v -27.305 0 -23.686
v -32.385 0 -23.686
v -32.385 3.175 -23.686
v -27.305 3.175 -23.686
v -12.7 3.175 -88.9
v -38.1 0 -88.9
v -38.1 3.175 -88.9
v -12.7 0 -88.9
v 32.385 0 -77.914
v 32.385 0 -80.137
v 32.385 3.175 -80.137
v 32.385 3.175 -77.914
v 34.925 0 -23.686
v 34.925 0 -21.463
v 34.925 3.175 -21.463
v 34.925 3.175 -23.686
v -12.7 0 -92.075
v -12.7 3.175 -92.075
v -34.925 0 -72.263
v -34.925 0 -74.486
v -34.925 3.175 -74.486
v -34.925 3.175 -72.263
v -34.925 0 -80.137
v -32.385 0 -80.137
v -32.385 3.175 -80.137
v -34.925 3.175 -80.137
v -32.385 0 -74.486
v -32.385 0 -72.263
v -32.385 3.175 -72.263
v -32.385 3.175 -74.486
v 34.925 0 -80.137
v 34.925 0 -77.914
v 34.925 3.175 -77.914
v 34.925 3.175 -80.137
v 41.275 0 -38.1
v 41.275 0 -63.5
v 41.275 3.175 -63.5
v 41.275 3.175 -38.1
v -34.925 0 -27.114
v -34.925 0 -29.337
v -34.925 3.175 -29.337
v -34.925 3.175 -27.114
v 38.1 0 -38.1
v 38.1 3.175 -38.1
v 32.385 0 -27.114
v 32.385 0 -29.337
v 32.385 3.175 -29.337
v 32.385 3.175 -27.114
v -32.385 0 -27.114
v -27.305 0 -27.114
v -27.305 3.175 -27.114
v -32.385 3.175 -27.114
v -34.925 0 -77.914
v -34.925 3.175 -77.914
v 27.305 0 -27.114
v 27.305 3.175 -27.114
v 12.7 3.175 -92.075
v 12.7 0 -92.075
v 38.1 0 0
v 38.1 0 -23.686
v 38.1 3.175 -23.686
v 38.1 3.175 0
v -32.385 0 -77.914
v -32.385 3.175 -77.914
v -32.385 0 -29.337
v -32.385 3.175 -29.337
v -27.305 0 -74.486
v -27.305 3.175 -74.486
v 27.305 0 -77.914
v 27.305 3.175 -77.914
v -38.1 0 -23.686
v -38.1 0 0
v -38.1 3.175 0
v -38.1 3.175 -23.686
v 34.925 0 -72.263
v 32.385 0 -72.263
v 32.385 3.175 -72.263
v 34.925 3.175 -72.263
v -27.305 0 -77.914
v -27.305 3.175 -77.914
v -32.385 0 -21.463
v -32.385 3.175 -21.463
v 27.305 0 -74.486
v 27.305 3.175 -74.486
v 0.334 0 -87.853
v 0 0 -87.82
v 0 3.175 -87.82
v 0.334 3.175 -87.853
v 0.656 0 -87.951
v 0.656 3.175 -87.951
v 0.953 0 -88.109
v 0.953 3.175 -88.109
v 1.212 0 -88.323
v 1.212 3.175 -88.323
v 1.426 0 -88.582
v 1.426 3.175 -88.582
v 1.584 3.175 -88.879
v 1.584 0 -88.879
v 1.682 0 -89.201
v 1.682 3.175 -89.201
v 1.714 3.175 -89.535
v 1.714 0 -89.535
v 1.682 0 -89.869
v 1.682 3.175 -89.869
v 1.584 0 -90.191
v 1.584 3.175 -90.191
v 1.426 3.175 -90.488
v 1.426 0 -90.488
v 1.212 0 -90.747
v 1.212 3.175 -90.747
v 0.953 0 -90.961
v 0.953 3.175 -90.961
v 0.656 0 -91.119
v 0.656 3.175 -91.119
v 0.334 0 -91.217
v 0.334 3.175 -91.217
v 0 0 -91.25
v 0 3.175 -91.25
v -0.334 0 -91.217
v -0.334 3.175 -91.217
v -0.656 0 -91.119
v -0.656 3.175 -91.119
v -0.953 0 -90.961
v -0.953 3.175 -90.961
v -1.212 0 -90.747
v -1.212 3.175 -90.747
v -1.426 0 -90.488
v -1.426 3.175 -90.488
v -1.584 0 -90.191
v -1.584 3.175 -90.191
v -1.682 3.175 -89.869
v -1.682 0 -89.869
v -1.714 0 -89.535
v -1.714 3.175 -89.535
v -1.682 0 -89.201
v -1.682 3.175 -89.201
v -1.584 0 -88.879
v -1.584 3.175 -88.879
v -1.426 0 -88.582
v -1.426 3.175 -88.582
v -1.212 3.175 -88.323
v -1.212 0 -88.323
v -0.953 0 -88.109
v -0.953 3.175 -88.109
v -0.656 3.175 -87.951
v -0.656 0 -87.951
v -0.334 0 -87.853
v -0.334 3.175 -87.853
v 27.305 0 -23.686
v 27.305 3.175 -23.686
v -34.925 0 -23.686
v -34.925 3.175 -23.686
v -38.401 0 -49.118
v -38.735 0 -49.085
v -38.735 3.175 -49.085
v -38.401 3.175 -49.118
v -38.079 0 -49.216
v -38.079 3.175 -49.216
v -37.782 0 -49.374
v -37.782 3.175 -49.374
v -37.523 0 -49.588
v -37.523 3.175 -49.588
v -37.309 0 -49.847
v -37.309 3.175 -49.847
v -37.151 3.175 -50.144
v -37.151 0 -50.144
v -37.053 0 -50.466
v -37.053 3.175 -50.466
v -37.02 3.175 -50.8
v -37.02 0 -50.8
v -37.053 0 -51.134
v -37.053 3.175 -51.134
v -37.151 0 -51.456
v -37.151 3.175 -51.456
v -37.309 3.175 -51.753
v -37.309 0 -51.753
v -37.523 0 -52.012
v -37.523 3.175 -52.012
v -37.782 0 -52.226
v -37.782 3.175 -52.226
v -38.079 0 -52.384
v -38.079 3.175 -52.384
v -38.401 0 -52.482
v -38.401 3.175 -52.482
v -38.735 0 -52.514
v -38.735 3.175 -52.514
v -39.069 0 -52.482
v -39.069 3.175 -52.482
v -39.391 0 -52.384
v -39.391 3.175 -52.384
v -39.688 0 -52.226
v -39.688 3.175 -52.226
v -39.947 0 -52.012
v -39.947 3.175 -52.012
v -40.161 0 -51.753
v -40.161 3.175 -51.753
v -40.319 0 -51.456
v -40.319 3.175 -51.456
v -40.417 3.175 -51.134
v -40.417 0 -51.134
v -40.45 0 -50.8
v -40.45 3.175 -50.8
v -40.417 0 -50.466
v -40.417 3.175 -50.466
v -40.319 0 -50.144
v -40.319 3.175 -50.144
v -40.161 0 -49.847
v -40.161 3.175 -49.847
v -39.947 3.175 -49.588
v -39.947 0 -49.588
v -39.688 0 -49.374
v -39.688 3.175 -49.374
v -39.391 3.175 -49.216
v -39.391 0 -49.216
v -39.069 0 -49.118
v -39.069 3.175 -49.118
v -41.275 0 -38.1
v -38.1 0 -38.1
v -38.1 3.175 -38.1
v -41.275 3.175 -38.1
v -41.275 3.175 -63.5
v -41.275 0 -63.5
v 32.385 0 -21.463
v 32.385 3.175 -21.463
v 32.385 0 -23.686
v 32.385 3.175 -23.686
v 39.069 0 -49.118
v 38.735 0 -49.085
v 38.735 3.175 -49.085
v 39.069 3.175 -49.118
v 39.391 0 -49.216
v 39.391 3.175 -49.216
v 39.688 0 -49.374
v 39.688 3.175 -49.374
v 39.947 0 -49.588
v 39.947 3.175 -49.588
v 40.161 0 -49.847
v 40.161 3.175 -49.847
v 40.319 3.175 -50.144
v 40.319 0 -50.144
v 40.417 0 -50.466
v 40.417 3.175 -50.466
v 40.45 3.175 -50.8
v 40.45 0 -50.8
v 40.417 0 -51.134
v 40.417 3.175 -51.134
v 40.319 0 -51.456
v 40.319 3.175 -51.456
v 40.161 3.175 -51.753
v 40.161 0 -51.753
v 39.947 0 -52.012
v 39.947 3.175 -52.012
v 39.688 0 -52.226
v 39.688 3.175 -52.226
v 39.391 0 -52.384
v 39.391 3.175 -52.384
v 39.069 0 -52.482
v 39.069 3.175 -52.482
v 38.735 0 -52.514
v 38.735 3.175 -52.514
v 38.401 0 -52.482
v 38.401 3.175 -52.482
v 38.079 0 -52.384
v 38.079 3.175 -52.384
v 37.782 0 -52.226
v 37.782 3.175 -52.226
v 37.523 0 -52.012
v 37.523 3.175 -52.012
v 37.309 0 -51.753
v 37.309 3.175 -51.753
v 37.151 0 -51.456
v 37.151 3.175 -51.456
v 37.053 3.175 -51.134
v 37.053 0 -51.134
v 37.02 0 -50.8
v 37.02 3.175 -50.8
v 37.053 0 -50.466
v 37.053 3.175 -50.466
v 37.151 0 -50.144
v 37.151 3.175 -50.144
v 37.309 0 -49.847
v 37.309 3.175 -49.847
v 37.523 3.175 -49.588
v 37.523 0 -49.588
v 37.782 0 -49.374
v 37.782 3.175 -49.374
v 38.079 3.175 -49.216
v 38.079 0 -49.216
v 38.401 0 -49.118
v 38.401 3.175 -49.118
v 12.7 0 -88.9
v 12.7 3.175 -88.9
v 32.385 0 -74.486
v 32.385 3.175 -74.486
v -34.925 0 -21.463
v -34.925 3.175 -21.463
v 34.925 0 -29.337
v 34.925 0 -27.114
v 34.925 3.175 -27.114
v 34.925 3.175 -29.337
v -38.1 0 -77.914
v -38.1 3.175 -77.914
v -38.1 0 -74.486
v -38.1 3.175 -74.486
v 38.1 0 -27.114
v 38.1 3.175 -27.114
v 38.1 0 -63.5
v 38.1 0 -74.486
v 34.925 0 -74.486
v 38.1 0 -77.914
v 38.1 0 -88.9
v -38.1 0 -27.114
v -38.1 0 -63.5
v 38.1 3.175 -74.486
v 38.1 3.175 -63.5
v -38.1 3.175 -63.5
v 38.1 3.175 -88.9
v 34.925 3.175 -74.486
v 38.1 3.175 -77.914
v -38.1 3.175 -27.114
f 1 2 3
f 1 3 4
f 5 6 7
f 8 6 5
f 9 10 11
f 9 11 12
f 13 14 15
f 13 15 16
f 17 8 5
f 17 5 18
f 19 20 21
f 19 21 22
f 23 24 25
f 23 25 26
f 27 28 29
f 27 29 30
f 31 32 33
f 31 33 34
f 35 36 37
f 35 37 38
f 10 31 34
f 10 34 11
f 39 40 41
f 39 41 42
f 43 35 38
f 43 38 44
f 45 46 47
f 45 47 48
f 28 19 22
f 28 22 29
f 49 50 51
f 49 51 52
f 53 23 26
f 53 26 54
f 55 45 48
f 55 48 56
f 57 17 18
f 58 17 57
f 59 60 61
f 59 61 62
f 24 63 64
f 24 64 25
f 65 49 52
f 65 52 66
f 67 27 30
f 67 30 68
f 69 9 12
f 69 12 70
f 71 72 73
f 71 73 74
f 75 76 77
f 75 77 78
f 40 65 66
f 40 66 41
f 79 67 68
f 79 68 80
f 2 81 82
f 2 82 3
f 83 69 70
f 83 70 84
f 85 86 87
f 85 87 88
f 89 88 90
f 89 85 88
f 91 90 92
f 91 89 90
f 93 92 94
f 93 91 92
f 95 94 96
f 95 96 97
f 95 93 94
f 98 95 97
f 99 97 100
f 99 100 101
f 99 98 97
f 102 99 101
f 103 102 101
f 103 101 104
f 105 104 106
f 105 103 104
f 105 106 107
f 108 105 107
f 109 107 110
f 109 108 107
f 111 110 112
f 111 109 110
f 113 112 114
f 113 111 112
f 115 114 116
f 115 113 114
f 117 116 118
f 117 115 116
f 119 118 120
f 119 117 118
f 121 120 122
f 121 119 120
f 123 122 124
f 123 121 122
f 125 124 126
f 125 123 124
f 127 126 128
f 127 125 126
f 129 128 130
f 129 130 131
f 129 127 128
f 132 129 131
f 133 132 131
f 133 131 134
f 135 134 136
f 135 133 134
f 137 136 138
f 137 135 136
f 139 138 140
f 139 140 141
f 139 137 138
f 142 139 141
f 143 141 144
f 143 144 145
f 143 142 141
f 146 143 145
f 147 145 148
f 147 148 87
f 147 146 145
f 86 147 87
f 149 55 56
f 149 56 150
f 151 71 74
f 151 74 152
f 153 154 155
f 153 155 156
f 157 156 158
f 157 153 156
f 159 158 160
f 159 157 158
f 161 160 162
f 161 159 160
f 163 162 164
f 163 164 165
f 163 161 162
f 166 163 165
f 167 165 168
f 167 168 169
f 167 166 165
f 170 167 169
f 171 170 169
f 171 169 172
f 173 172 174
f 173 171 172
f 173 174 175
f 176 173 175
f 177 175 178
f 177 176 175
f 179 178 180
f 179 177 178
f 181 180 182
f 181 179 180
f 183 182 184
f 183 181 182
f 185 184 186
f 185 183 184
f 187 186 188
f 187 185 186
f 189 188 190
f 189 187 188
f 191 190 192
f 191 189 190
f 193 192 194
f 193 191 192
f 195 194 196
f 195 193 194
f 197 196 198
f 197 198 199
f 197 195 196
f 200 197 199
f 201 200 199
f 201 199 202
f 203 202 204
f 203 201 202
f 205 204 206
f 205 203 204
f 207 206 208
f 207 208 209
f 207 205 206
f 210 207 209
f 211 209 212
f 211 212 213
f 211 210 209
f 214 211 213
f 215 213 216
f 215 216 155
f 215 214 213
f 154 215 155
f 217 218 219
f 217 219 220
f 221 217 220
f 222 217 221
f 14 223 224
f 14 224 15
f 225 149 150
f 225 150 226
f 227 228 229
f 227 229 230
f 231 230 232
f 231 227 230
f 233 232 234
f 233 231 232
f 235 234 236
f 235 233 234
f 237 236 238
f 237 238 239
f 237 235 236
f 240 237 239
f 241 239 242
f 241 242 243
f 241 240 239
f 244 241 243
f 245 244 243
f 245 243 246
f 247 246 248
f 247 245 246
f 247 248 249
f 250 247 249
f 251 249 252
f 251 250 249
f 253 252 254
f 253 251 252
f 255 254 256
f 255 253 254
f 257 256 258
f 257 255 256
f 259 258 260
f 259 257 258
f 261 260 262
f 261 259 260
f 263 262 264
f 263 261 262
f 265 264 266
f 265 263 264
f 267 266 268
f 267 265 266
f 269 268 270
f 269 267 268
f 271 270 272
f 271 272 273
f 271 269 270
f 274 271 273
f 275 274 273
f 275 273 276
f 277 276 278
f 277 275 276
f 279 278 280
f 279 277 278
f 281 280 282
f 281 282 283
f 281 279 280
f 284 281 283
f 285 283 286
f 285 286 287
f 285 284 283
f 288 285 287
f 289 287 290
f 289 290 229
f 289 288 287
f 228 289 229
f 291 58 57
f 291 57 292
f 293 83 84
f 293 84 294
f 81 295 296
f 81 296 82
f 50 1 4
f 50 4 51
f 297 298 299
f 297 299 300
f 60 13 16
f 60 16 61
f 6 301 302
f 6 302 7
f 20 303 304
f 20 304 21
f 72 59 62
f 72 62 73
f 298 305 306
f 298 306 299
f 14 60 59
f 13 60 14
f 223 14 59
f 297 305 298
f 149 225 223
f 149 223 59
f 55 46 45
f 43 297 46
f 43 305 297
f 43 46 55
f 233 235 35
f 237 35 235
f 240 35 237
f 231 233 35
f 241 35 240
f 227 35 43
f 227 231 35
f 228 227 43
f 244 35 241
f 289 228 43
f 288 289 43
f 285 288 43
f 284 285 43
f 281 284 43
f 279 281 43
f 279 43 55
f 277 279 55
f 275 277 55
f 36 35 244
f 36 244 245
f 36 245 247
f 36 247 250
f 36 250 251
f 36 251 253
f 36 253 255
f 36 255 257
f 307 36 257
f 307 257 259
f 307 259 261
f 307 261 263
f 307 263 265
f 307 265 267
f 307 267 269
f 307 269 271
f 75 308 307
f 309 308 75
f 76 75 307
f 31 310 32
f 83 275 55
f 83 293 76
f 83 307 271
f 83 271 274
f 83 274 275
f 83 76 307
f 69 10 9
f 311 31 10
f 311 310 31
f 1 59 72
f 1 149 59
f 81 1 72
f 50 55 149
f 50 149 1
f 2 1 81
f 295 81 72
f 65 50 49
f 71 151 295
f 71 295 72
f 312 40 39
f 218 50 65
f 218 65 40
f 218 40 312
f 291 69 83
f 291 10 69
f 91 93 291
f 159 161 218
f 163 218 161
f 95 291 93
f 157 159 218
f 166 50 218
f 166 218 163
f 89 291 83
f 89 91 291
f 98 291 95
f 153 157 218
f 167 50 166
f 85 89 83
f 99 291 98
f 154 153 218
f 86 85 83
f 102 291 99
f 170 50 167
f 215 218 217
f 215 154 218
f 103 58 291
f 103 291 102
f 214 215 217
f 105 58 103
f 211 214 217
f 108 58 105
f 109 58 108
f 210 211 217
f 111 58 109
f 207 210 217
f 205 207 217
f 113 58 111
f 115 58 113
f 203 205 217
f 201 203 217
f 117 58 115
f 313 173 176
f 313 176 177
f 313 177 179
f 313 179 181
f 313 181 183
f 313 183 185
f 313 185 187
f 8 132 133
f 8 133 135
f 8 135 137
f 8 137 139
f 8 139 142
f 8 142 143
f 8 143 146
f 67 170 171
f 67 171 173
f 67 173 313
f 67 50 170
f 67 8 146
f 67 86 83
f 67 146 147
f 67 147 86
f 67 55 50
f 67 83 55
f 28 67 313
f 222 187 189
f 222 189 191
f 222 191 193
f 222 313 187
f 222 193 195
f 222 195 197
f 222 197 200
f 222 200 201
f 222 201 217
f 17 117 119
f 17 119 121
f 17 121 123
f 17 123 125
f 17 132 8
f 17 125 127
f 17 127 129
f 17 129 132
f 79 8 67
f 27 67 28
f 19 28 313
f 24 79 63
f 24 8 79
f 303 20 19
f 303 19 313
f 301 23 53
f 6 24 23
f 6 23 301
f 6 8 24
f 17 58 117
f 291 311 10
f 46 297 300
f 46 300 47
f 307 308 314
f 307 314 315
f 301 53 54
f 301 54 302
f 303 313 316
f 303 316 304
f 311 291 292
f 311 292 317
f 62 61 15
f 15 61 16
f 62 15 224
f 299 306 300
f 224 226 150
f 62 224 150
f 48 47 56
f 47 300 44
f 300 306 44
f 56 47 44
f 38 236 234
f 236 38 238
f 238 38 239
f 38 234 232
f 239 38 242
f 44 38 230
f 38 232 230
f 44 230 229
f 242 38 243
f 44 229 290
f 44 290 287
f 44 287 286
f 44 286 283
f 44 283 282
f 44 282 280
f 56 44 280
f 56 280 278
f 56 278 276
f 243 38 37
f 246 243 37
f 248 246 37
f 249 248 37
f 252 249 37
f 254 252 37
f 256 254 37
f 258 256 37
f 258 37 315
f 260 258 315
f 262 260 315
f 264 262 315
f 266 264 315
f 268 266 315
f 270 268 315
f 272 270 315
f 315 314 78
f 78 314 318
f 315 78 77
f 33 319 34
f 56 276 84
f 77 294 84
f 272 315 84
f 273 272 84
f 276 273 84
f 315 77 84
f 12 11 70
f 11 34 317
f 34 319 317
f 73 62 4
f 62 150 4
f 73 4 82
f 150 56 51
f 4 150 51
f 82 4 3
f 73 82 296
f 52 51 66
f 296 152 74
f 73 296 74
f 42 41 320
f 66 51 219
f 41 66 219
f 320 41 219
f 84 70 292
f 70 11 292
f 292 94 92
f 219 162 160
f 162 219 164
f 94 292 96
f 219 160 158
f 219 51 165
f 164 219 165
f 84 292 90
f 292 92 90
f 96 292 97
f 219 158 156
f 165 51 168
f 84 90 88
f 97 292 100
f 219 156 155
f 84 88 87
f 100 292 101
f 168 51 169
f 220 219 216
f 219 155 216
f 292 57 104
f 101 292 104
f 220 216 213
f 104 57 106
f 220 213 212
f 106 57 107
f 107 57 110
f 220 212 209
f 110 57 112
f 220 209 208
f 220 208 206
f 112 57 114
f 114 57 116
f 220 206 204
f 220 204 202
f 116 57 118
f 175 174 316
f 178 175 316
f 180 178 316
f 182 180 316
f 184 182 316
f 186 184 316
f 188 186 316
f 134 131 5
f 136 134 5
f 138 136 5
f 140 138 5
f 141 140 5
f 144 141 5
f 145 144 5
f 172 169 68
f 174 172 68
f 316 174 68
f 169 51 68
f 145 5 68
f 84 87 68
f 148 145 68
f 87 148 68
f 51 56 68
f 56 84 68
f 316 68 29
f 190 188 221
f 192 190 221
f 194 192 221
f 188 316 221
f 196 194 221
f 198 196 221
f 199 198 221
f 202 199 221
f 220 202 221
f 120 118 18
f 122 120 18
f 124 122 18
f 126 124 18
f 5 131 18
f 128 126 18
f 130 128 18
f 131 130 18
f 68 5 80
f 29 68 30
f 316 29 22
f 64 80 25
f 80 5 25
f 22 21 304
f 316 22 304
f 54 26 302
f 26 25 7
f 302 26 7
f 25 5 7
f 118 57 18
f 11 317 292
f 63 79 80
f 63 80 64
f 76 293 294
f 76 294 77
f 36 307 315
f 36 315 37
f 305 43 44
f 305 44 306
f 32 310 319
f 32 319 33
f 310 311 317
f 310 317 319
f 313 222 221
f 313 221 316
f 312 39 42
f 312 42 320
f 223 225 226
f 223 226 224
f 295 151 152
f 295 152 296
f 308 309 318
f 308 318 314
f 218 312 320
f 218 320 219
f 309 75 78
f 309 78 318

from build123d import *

# Parameters (mm, degrees)
SKETCH1_R           = 1.7145
BOSS_EXTRUDE1_DEPTH = 3.175


with BuildPart() as part:
    # Sketch1 → Boss-Extrude1 (new body)
    with BuildSketch(Plane(origin=(0, 0, 0), x_dir=(1, 0, 0), z_dir=(0, 1, 0))):
        Polygon((-38.1, 0), (-38.1, 23.6855), (-34.925, 23.6855), (-34.925, 21.463), (-32.385, 21.463), (-32.385, 23.6855), (-27.305, 23.6855), (-27.305, 27.1145), (-32.385, 27.1145), (-32.385, 29.337), (-34.925, 29.337), (-34.925, 27.1145), (-38.1, 27.1145), (-38.1, 38.1), (-41.275, 38.1), (-41.275, 63.5), (-38.1, 63.5), (-38.1, 74.4855), (-34.925, 74.4855), (-34.925, 72.263), (-32.385, 72.263), (-32.385, 74.4855), (-27.305, 74.4855), (-27.305, 77.9145), (-32.385, 77.9145), (-32.385, 80.137), (-34.925, 80.137), (-34.925, 77.9145), (-38.1, 77.9145), (-38.1, 88.9), (-12.7, 88.9), (-12.7, 92.075), (12.7, 92.075), (12.7, 88.9), (38.1, 88.9), (38.1, 77.9145), (34.925, 77.9145), (34.925, 80.137), (32.385, 80.137), (32.385, 77.9145), (27.305, 77.9145), (27.305, 74.4855), (32.385, 74.4855), (32.385, 72.263), (34.925, 72.263), (34.925, 74.4855), (38.1, 74.4855), (38.1, 63.5), (41.275, 63.5), (41.275, 38.1), (38.1, 38.1), (38.1, 27.1145), (34.925, 27.1145), (34.925, 29.337), (32.385, 29.337), (32.385, 27.1145), (27.305, 27.1145), (27.305, 23.6855), (32.385, 23.6855), (32.385, 21.463), (34.925, 21.463), (34.925, 23.6855), (38.1, 23.6855), (38.1, 0), align=None)
        with Locations(Location((-38.735, 50.8, 0), (0, 0, 270))):
            Circle(SKETCH1_R, mode=Mode.SUBTRACT)
        with Locations(Location((0, 89.535, 0), (0, 0, 270))):
            Circle(SKETCH1_R, mode=Mode.SUBTRACT)
        with Locations(Location((38.735, 50.8, 0), (0, 0, 270))):
            Circle(SKETCH1_R, mode=Mode.SUBTRACT)
    extrude(amount=BOSS_EXTRUDE1_DEPTH)


solid = part.part
